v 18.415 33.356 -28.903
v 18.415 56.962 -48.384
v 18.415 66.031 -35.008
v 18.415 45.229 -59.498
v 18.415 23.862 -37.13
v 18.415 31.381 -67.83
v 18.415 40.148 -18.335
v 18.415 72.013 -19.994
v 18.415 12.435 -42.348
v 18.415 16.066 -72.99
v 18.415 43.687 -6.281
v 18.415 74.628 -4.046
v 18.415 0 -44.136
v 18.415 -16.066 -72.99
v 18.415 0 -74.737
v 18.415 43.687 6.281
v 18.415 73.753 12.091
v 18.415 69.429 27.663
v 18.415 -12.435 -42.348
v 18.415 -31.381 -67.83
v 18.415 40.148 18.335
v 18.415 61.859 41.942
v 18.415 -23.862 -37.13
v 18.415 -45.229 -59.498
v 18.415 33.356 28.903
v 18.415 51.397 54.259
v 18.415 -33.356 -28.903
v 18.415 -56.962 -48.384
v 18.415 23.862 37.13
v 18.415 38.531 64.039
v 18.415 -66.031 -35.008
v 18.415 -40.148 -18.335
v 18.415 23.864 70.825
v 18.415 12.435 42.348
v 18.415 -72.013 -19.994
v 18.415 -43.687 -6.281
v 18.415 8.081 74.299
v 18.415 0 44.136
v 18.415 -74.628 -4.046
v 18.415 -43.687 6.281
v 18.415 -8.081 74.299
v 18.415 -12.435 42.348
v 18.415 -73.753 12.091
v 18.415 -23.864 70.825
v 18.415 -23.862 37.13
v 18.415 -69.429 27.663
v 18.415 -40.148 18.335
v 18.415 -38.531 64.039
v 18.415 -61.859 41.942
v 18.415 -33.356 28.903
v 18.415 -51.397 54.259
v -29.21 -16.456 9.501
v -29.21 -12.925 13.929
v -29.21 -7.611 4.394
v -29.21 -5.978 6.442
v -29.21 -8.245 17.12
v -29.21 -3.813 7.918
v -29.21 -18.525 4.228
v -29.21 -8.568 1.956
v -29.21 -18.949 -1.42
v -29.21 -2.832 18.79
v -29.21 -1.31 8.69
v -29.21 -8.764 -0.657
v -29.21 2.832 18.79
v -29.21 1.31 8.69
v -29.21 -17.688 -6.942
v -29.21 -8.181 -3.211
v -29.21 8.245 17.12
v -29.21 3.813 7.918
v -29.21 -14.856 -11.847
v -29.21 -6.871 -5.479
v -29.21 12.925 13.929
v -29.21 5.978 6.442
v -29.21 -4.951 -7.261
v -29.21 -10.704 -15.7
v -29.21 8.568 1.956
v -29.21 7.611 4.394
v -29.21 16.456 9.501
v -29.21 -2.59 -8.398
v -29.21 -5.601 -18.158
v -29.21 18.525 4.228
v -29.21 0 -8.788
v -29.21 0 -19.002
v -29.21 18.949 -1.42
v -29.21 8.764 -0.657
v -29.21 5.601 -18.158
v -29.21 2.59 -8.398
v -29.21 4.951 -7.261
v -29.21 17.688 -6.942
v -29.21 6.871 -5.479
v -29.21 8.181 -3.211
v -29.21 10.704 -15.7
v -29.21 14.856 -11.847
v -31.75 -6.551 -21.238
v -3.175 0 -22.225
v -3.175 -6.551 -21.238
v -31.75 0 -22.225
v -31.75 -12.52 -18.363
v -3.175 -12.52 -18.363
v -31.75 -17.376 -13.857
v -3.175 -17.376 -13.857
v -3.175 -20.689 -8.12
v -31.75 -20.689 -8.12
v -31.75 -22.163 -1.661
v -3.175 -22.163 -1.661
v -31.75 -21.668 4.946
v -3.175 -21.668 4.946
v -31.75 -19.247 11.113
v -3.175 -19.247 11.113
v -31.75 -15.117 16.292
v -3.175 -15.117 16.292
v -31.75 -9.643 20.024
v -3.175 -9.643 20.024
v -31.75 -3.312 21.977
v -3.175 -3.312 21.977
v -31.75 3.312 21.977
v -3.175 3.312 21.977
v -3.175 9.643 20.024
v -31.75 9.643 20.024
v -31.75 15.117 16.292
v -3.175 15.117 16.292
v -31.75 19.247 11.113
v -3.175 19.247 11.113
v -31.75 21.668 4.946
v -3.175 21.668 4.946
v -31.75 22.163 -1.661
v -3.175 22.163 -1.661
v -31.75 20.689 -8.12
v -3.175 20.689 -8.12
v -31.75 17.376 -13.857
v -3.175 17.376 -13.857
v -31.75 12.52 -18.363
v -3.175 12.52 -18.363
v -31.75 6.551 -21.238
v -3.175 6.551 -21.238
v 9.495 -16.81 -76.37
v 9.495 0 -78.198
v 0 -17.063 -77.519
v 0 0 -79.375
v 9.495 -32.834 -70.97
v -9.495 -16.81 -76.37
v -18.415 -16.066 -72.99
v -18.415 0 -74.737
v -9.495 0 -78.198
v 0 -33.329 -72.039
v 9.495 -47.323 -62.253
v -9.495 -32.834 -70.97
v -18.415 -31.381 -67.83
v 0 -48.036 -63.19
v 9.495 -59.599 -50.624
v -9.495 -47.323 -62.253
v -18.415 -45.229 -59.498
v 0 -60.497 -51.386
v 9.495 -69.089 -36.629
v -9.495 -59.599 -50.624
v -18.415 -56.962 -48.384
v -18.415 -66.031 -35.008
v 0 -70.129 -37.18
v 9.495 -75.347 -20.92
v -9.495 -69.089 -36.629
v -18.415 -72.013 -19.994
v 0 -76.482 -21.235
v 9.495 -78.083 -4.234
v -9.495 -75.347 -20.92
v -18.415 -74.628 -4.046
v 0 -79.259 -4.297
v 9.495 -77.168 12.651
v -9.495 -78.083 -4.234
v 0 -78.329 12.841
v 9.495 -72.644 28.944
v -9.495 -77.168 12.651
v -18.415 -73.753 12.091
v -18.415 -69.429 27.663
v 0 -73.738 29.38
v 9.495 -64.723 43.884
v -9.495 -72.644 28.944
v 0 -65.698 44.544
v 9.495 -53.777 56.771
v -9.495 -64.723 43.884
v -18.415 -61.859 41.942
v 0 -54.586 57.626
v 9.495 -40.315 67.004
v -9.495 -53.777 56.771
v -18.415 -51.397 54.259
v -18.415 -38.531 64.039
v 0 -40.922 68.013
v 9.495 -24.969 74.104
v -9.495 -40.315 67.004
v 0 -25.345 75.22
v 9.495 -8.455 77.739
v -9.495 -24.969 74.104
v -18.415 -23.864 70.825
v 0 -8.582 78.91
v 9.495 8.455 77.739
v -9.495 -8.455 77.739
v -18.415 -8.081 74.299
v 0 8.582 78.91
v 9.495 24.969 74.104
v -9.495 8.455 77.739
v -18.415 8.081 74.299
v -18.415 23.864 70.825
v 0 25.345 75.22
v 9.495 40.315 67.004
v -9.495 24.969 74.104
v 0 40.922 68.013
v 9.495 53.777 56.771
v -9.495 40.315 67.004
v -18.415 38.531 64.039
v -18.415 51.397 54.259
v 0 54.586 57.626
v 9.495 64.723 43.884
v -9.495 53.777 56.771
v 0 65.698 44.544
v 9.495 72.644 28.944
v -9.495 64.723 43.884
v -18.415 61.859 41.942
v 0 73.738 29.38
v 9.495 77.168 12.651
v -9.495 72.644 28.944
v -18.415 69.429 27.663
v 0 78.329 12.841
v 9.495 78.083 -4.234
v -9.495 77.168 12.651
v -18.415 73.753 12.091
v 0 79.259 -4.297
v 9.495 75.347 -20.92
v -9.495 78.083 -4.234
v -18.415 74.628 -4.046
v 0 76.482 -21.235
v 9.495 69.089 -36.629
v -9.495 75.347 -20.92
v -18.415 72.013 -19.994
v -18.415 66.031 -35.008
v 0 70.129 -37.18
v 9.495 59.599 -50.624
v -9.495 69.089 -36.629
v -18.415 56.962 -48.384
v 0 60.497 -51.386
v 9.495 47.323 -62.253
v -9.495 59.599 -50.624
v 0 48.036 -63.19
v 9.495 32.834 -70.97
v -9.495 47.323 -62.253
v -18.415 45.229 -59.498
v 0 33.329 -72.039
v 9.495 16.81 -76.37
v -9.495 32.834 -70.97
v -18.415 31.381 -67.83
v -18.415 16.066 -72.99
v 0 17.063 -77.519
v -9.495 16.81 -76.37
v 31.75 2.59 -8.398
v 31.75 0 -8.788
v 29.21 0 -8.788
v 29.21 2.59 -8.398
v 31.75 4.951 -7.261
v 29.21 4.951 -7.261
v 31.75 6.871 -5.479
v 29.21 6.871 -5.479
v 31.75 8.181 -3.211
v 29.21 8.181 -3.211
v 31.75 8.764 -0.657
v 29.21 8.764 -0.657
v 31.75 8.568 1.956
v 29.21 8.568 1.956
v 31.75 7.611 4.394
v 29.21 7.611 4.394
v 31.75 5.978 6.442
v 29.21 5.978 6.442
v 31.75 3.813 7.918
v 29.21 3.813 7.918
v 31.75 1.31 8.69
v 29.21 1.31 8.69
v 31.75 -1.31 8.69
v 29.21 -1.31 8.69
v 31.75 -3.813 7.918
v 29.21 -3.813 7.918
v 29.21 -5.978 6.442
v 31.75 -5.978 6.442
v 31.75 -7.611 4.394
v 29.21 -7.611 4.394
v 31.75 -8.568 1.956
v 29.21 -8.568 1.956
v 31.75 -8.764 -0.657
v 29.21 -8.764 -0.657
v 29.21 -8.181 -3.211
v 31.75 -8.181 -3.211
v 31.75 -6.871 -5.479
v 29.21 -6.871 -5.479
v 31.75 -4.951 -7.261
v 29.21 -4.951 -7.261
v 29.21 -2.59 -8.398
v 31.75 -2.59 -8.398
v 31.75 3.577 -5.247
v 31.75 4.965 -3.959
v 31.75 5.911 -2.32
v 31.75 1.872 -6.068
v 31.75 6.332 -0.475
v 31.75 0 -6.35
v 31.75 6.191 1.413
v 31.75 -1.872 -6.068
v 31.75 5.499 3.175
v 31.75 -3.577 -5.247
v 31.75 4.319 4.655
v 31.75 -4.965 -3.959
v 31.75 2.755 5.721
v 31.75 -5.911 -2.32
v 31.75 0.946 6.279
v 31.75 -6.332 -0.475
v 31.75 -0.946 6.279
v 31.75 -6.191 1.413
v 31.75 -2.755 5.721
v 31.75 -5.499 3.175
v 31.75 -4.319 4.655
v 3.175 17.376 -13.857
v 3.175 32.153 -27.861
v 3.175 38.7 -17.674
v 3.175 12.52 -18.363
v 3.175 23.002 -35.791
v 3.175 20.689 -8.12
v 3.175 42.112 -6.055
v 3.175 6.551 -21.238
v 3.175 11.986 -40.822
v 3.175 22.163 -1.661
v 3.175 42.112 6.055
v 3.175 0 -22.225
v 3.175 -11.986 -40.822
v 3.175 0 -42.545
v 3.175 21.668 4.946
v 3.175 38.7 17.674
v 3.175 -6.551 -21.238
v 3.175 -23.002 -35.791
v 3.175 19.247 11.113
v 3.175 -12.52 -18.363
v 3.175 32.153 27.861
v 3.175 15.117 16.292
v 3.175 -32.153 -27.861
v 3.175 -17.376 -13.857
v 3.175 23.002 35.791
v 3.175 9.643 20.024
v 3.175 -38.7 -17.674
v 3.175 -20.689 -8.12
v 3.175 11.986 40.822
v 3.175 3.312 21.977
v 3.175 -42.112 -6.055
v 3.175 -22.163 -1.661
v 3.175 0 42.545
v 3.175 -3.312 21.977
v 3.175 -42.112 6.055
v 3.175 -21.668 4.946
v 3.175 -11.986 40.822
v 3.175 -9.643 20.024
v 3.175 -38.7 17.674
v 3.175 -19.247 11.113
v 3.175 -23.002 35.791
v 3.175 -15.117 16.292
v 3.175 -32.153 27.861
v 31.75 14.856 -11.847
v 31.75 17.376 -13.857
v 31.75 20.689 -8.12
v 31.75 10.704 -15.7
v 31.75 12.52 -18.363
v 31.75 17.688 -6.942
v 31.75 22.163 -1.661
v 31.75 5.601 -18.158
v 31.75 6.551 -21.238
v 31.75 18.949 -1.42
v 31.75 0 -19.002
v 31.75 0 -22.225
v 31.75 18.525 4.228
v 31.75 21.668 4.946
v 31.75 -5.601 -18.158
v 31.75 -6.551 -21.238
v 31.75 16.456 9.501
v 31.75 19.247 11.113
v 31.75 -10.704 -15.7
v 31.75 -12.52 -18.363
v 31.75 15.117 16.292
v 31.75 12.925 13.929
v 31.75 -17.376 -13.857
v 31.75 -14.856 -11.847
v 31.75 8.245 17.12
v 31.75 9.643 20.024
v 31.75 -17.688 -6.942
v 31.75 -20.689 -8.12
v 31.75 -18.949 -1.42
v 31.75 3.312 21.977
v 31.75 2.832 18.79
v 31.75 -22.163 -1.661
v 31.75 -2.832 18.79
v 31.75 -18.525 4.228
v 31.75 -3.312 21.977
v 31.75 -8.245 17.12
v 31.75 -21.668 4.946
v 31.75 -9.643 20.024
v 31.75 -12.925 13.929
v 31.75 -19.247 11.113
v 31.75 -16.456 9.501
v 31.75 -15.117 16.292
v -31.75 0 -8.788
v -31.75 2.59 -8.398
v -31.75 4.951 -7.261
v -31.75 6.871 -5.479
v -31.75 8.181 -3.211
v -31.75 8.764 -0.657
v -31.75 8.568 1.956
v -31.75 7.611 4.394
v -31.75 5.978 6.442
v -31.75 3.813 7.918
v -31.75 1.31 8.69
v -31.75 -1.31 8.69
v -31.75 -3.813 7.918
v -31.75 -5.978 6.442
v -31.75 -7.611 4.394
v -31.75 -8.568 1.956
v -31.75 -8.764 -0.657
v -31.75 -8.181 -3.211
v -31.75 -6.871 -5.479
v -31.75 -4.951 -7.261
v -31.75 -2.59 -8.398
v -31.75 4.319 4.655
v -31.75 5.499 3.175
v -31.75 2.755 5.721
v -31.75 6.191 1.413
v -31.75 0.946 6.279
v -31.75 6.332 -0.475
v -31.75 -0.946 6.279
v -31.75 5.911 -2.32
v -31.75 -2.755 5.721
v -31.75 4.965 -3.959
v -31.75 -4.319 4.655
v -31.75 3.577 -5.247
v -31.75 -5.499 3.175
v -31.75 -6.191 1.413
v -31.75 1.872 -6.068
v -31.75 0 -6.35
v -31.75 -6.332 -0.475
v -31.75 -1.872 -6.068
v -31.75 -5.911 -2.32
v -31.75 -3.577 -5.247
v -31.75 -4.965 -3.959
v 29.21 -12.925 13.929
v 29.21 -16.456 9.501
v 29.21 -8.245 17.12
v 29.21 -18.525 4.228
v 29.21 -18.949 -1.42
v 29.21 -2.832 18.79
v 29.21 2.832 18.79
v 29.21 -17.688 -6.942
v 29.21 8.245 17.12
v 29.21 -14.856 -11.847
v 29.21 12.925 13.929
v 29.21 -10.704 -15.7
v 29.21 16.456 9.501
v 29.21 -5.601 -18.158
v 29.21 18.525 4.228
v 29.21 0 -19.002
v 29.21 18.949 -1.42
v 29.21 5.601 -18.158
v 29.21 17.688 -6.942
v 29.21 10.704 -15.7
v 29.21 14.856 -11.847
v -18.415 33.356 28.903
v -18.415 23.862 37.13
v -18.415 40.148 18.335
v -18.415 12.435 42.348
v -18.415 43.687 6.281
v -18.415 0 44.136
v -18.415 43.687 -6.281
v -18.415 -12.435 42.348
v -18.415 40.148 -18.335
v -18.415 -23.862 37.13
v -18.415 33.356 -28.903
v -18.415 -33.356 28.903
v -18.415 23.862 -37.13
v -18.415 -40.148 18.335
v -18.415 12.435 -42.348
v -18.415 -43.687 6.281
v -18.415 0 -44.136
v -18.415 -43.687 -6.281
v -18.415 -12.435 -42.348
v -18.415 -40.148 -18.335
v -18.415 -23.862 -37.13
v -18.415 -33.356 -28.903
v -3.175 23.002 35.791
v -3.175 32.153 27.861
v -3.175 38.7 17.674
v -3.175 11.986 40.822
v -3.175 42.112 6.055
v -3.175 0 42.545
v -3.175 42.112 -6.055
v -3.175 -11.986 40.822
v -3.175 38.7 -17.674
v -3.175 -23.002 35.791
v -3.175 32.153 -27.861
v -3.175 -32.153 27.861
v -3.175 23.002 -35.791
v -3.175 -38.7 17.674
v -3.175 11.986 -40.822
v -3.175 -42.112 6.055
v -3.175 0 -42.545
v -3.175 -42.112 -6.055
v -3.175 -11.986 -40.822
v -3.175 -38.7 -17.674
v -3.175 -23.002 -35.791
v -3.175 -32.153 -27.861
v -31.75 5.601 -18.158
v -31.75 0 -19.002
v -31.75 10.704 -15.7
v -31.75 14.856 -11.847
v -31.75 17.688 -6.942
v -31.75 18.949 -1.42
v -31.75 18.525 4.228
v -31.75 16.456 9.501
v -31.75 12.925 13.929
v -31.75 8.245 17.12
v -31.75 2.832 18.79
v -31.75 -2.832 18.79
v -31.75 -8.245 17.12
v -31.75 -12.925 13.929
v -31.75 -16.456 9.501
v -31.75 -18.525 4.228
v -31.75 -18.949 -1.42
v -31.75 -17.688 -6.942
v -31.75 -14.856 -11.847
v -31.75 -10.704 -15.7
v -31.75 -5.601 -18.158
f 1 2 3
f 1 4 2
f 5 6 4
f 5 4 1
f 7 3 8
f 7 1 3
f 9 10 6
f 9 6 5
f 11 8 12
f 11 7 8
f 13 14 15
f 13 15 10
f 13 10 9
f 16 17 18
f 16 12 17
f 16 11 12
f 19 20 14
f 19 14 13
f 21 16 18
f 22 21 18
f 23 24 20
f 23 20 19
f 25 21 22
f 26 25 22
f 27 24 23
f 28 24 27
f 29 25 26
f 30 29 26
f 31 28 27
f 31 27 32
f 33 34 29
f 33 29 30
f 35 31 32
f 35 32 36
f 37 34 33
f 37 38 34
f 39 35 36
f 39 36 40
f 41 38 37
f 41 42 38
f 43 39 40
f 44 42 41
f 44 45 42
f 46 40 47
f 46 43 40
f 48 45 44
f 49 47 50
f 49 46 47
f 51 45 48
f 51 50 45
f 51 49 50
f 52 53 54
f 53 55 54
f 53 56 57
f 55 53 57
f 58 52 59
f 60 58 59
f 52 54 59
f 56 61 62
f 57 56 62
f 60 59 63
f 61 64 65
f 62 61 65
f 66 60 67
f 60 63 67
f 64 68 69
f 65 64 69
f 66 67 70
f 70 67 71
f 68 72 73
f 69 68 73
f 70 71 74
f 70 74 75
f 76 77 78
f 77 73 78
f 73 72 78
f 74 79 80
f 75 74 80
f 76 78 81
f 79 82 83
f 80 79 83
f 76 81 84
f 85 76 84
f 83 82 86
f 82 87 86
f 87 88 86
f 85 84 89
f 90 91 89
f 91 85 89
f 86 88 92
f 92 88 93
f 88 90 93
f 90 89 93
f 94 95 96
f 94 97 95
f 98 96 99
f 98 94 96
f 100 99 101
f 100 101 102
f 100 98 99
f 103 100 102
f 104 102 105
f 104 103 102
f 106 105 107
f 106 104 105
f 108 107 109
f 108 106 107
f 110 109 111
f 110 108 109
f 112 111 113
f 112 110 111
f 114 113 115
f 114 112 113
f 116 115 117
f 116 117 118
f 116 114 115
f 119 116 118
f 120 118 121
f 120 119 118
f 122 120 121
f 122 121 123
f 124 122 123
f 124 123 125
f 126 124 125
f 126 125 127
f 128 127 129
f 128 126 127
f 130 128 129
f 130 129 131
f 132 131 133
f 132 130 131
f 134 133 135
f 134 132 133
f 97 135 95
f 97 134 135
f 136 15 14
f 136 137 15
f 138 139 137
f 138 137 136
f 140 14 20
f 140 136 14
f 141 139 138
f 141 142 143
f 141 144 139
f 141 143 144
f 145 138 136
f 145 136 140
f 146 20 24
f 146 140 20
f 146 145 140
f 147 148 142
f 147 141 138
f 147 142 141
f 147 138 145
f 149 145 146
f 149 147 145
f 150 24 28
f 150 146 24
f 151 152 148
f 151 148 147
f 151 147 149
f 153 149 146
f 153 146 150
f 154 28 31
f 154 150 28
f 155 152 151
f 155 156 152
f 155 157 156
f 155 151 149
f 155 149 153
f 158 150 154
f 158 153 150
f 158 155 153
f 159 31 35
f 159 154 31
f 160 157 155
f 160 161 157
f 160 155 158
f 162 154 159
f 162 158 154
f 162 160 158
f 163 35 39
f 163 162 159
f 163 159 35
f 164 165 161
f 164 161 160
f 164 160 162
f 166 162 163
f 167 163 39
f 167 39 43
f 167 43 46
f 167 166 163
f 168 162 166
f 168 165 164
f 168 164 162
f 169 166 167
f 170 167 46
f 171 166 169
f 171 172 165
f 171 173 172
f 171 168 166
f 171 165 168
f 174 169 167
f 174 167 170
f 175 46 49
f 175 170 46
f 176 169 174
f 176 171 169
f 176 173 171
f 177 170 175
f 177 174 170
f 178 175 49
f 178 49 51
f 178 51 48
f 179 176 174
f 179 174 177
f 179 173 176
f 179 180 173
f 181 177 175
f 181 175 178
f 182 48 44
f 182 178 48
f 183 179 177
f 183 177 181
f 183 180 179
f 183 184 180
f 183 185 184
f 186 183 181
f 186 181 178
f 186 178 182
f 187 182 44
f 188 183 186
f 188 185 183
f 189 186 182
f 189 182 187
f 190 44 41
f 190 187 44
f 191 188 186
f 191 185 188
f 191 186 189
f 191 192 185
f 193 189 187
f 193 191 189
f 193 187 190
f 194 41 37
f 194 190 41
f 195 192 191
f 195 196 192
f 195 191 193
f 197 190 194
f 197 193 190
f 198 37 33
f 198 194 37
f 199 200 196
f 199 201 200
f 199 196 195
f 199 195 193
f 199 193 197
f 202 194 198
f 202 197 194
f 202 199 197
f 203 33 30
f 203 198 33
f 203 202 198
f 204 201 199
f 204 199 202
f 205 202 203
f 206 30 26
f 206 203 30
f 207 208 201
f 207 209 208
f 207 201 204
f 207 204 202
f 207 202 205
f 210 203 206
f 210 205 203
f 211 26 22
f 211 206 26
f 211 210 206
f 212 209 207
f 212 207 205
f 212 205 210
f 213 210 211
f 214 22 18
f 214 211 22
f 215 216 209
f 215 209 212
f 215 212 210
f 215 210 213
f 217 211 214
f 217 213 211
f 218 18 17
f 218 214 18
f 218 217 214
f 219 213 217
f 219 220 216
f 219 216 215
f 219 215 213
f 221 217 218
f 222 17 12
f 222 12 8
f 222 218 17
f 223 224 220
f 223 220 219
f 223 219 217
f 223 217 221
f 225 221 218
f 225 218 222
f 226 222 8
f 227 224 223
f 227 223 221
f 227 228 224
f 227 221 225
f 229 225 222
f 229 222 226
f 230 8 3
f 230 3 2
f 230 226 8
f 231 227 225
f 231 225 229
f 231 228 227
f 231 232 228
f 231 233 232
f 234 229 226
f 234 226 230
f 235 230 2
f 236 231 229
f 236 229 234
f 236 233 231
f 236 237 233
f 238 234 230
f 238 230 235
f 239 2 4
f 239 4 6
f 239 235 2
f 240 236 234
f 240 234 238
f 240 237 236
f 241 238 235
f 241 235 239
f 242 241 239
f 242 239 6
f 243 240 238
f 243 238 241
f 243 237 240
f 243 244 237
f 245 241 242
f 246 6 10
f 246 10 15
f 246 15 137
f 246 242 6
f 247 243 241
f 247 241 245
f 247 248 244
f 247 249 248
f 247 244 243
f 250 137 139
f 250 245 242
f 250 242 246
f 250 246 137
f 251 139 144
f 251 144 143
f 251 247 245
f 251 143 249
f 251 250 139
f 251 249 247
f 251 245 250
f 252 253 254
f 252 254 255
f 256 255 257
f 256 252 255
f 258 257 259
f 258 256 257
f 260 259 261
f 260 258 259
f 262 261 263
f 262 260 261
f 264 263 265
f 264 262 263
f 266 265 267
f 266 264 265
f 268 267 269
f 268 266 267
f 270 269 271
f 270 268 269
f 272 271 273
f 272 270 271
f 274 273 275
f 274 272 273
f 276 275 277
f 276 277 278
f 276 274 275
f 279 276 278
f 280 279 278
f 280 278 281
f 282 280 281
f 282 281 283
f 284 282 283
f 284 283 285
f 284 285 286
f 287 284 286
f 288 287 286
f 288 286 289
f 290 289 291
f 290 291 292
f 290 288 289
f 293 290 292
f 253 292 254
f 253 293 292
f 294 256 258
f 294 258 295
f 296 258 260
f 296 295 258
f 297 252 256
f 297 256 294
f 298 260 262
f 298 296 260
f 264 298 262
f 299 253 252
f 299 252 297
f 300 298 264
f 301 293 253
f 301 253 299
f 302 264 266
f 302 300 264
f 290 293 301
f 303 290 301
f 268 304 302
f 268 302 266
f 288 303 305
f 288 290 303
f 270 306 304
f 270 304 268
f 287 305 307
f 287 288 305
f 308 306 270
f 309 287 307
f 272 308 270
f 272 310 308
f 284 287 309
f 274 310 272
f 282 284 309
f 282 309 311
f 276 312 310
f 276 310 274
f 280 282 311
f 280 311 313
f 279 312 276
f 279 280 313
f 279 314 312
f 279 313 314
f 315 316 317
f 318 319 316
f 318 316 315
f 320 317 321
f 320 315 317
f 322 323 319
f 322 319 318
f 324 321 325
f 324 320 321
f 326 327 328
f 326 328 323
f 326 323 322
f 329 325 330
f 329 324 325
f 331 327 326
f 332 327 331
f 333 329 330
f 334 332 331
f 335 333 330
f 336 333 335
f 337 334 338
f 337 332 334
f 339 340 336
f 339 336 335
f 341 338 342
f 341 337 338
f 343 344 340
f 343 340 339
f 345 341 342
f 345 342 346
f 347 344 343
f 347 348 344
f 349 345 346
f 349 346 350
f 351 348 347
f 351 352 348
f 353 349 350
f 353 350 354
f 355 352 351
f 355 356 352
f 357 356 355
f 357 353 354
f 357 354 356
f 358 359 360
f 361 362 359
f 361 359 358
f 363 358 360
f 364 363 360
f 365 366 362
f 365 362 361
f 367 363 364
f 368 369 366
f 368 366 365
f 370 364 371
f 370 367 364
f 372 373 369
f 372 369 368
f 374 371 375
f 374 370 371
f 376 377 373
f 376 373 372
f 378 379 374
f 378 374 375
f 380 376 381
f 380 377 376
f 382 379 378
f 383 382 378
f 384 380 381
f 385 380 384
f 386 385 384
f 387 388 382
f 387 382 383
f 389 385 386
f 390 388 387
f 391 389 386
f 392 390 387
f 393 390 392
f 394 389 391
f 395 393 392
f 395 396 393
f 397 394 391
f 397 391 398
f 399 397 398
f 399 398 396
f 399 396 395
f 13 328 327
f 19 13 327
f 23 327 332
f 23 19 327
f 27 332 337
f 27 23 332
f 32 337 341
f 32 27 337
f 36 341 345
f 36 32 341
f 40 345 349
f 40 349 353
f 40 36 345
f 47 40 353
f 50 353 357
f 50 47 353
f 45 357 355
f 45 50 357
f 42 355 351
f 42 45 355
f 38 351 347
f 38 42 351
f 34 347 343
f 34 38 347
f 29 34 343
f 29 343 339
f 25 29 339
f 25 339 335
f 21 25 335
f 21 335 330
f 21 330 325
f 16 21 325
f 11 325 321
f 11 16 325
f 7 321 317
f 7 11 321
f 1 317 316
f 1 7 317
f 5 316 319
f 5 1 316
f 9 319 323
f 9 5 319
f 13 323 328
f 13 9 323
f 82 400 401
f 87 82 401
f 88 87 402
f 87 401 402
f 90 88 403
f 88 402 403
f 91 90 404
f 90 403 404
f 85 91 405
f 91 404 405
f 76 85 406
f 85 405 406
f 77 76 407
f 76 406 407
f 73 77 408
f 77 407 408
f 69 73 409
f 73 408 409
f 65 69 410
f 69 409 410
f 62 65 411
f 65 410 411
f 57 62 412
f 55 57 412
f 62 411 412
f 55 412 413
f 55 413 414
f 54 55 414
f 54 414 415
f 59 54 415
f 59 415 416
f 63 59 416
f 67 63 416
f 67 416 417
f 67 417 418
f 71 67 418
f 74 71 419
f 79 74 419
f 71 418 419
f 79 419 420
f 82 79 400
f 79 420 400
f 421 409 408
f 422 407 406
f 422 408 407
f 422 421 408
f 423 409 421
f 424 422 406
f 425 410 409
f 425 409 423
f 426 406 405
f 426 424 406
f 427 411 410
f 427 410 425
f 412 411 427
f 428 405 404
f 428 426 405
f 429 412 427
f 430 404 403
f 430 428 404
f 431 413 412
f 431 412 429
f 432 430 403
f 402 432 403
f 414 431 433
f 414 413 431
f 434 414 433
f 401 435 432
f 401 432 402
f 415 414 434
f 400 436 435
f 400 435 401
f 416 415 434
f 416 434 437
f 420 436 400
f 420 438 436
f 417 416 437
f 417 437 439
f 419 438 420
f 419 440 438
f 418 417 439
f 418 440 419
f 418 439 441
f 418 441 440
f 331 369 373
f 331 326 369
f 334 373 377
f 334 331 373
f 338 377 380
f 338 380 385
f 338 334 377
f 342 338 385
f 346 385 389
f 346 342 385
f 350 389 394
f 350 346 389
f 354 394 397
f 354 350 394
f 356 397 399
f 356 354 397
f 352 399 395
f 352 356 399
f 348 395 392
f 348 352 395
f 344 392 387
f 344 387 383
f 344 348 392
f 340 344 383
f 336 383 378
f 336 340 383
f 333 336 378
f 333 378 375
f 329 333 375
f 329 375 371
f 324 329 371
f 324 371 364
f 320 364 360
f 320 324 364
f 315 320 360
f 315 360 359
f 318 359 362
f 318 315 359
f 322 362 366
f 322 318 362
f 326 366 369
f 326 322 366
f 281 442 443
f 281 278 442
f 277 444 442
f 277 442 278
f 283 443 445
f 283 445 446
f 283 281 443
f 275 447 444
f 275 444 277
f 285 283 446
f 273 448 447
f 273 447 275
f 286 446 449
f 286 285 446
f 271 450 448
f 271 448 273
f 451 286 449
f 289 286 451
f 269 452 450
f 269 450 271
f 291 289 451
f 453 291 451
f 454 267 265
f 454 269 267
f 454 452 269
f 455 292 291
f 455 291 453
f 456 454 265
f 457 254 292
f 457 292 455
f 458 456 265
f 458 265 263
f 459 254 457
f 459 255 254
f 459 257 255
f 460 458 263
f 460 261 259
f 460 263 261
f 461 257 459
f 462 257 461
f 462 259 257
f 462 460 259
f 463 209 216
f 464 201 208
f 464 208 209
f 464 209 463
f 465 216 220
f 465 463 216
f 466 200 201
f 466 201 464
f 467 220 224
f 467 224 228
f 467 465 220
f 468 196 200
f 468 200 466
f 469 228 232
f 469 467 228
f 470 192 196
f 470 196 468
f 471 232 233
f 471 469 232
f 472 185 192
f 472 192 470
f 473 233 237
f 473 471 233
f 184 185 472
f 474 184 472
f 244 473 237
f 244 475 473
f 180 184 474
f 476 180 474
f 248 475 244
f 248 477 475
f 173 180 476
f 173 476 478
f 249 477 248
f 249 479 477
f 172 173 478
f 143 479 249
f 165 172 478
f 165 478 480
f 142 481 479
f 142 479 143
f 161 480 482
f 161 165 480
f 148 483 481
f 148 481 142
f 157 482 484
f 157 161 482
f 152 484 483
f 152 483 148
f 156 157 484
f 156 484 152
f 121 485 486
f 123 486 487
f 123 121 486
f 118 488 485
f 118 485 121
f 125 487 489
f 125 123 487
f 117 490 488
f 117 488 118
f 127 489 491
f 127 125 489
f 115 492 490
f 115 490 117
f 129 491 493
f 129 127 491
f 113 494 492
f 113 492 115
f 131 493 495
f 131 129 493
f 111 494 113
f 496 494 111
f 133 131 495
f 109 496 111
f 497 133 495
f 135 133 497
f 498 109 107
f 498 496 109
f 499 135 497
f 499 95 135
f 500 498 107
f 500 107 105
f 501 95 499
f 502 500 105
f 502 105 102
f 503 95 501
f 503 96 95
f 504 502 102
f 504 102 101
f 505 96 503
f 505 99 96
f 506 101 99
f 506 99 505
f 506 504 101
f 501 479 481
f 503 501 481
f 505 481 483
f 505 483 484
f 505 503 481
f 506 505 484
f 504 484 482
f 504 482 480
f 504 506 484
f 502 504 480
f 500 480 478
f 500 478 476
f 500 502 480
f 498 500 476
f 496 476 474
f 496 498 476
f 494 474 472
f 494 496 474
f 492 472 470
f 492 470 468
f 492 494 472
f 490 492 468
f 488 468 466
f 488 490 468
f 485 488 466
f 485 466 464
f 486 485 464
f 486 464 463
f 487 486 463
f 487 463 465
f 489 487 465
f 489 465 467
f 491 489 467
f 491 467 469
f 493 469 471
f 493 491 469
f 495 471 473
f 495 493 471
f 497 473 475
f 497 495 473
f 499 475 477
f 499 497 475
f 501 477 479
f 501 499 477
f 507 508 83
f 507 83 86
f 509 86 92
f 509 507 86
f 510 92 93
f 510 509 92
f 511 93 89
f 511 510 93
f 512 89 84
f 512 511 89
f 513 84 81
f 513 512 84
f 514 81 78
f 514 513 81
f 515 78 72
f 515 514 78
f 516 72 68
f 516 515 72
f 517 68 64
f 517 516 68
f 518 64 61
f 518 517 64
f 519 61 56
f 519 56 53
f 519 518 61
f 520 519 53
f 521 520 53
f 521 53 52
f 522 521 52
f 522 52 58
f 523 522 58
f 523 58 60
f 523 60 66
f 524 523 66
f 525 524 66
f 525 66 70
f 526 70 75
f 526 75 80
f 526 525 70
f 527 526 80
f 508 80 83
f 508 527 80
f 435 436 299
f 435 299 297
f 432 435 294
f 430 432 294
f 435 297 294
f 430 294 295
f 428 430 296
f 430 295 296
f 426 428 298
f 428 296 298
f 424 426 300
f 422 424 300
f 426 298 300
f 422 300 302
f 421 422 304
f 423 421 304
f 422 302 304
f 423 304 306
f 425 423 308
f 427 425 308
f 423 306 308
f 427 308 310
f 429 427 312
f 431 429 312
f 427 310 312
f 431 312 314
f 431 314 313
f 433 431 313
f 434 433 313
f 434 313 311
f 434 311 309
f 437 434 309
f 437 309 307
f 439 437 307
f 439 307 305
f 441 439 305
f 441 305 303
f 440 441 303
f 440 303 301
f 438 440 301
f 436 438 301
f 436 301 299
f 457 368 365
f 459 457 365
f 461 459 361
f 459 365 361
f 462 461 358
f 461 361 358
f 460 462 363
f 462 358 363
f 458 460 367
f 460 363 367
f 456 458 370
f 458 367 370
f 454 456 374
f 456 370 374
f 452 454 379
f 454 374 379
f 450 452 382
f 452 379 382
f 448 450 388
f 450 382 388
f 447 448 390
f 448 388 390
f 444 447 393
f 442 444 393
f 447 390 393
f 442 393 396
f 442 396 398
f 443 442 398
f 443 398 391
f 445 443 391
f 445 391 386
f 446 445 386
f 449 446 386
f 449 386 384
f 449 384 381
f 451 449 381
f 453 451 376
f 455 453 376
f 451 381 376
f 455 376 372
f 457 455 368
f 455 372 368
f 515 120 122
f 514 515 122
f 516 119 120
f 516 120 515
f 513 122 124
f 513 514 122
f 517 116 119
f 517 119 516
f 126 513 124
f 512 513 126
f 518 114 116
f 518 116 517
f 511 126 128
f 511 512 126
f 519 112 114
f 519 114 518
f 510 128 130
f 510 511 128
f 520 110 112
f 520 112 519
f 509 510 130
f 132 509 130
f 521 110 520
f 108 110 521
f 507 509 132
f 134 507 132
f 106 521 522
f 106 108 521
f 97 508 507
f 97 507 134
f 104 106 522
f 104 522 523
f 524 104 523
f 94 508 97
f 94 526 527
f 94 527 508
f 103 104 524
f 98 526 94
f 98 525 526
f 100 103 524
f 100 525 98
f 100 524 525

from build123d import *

# Parameters (mm, degrees)
SKETCH2_R          = 19.001809039
SKETCH2_R_2        = 8.788318948
CUT_EXTRUDE1_DEPTH = 2.54
SKETCH3_R          = 6.35
CUT_EXTRUDE2_DEPTH = 64.5


with BuildPart() as part:
    # Sketch1 → Revolve1 (revolve)
    with BuildSketch(Plane(origin=(0, 0, 0), x_dir=(1, 0, 0), z_dir=(0, 1, 0))):
        with BuildLine():
            Line((-31.75, 22.225), (-31.75, 0))
            Line((-31.75, 0), (31.75, 0))
            Line((31.75, 0), (31.75, 22.225))
            Line((31.75, 22.225), (3.175, 22.225))
            Line((3.175, 22.225), (3.175, 42.545))
            Line((3.175, 42.545), (18.415, 44.136059808))
            Line((18.415, 44.136059808), (18.415, 74.737433252))
            ThreePointArc((18.415, 74.737433252), (0, 79.375), (-18.415, 74.737433252))
            Line((-18.415, 74.737433252), (-18.415, 44.136059808))
            Line((-18.415, 44.136059808), (-3.175, 42.545))
            Line((-3.175, 42.545), (-3.175, 22.225))
            Line((-3.175, 22.225), (-31.75, 22.225))
        make_face()
    revolve(axis=Axis((-31.75, 0, 0), (-1, 0, 0)))

    # Sketch2 → Cut-Extrude1 (cut)
    with BuildSketch(Plane(origin=(31.75, 0, 0), x_dir=(0, 0, -1), z_dir=(1, 0, 0))):
        Circle(SKETCH2_R)
        Circle(SKETCH2_R_2, mode=Mode.SUBTRACT)
    cut_extrude1 = extrude(amount=-CUT_EXTRUDE1_DEPTH, mode=Mode.SUBTRACT)

    # Sketch3 → Cut-Extrude2 (cut, through all)
    with BuildSketch(Plane(origin=(31.75, 0, 0), x_dir=(0, 0, -1), z_dir=(1, 0, 0))):
        Circle(SKETCH3_R)
    extrude(amount=-CUT_EXTRUDE2_DEPTH, mode=Mode.SUBTRACT)

    # Mirror3: Cut-Extrude1 across plane
    add(cut_extrude1.mirror(Plane(origin=(0, 0, 0), x_dir=(0, 0, 1), z_dir=(1, 0, 0))), mode=Mode.SUBTRACT)


solid = part.part
